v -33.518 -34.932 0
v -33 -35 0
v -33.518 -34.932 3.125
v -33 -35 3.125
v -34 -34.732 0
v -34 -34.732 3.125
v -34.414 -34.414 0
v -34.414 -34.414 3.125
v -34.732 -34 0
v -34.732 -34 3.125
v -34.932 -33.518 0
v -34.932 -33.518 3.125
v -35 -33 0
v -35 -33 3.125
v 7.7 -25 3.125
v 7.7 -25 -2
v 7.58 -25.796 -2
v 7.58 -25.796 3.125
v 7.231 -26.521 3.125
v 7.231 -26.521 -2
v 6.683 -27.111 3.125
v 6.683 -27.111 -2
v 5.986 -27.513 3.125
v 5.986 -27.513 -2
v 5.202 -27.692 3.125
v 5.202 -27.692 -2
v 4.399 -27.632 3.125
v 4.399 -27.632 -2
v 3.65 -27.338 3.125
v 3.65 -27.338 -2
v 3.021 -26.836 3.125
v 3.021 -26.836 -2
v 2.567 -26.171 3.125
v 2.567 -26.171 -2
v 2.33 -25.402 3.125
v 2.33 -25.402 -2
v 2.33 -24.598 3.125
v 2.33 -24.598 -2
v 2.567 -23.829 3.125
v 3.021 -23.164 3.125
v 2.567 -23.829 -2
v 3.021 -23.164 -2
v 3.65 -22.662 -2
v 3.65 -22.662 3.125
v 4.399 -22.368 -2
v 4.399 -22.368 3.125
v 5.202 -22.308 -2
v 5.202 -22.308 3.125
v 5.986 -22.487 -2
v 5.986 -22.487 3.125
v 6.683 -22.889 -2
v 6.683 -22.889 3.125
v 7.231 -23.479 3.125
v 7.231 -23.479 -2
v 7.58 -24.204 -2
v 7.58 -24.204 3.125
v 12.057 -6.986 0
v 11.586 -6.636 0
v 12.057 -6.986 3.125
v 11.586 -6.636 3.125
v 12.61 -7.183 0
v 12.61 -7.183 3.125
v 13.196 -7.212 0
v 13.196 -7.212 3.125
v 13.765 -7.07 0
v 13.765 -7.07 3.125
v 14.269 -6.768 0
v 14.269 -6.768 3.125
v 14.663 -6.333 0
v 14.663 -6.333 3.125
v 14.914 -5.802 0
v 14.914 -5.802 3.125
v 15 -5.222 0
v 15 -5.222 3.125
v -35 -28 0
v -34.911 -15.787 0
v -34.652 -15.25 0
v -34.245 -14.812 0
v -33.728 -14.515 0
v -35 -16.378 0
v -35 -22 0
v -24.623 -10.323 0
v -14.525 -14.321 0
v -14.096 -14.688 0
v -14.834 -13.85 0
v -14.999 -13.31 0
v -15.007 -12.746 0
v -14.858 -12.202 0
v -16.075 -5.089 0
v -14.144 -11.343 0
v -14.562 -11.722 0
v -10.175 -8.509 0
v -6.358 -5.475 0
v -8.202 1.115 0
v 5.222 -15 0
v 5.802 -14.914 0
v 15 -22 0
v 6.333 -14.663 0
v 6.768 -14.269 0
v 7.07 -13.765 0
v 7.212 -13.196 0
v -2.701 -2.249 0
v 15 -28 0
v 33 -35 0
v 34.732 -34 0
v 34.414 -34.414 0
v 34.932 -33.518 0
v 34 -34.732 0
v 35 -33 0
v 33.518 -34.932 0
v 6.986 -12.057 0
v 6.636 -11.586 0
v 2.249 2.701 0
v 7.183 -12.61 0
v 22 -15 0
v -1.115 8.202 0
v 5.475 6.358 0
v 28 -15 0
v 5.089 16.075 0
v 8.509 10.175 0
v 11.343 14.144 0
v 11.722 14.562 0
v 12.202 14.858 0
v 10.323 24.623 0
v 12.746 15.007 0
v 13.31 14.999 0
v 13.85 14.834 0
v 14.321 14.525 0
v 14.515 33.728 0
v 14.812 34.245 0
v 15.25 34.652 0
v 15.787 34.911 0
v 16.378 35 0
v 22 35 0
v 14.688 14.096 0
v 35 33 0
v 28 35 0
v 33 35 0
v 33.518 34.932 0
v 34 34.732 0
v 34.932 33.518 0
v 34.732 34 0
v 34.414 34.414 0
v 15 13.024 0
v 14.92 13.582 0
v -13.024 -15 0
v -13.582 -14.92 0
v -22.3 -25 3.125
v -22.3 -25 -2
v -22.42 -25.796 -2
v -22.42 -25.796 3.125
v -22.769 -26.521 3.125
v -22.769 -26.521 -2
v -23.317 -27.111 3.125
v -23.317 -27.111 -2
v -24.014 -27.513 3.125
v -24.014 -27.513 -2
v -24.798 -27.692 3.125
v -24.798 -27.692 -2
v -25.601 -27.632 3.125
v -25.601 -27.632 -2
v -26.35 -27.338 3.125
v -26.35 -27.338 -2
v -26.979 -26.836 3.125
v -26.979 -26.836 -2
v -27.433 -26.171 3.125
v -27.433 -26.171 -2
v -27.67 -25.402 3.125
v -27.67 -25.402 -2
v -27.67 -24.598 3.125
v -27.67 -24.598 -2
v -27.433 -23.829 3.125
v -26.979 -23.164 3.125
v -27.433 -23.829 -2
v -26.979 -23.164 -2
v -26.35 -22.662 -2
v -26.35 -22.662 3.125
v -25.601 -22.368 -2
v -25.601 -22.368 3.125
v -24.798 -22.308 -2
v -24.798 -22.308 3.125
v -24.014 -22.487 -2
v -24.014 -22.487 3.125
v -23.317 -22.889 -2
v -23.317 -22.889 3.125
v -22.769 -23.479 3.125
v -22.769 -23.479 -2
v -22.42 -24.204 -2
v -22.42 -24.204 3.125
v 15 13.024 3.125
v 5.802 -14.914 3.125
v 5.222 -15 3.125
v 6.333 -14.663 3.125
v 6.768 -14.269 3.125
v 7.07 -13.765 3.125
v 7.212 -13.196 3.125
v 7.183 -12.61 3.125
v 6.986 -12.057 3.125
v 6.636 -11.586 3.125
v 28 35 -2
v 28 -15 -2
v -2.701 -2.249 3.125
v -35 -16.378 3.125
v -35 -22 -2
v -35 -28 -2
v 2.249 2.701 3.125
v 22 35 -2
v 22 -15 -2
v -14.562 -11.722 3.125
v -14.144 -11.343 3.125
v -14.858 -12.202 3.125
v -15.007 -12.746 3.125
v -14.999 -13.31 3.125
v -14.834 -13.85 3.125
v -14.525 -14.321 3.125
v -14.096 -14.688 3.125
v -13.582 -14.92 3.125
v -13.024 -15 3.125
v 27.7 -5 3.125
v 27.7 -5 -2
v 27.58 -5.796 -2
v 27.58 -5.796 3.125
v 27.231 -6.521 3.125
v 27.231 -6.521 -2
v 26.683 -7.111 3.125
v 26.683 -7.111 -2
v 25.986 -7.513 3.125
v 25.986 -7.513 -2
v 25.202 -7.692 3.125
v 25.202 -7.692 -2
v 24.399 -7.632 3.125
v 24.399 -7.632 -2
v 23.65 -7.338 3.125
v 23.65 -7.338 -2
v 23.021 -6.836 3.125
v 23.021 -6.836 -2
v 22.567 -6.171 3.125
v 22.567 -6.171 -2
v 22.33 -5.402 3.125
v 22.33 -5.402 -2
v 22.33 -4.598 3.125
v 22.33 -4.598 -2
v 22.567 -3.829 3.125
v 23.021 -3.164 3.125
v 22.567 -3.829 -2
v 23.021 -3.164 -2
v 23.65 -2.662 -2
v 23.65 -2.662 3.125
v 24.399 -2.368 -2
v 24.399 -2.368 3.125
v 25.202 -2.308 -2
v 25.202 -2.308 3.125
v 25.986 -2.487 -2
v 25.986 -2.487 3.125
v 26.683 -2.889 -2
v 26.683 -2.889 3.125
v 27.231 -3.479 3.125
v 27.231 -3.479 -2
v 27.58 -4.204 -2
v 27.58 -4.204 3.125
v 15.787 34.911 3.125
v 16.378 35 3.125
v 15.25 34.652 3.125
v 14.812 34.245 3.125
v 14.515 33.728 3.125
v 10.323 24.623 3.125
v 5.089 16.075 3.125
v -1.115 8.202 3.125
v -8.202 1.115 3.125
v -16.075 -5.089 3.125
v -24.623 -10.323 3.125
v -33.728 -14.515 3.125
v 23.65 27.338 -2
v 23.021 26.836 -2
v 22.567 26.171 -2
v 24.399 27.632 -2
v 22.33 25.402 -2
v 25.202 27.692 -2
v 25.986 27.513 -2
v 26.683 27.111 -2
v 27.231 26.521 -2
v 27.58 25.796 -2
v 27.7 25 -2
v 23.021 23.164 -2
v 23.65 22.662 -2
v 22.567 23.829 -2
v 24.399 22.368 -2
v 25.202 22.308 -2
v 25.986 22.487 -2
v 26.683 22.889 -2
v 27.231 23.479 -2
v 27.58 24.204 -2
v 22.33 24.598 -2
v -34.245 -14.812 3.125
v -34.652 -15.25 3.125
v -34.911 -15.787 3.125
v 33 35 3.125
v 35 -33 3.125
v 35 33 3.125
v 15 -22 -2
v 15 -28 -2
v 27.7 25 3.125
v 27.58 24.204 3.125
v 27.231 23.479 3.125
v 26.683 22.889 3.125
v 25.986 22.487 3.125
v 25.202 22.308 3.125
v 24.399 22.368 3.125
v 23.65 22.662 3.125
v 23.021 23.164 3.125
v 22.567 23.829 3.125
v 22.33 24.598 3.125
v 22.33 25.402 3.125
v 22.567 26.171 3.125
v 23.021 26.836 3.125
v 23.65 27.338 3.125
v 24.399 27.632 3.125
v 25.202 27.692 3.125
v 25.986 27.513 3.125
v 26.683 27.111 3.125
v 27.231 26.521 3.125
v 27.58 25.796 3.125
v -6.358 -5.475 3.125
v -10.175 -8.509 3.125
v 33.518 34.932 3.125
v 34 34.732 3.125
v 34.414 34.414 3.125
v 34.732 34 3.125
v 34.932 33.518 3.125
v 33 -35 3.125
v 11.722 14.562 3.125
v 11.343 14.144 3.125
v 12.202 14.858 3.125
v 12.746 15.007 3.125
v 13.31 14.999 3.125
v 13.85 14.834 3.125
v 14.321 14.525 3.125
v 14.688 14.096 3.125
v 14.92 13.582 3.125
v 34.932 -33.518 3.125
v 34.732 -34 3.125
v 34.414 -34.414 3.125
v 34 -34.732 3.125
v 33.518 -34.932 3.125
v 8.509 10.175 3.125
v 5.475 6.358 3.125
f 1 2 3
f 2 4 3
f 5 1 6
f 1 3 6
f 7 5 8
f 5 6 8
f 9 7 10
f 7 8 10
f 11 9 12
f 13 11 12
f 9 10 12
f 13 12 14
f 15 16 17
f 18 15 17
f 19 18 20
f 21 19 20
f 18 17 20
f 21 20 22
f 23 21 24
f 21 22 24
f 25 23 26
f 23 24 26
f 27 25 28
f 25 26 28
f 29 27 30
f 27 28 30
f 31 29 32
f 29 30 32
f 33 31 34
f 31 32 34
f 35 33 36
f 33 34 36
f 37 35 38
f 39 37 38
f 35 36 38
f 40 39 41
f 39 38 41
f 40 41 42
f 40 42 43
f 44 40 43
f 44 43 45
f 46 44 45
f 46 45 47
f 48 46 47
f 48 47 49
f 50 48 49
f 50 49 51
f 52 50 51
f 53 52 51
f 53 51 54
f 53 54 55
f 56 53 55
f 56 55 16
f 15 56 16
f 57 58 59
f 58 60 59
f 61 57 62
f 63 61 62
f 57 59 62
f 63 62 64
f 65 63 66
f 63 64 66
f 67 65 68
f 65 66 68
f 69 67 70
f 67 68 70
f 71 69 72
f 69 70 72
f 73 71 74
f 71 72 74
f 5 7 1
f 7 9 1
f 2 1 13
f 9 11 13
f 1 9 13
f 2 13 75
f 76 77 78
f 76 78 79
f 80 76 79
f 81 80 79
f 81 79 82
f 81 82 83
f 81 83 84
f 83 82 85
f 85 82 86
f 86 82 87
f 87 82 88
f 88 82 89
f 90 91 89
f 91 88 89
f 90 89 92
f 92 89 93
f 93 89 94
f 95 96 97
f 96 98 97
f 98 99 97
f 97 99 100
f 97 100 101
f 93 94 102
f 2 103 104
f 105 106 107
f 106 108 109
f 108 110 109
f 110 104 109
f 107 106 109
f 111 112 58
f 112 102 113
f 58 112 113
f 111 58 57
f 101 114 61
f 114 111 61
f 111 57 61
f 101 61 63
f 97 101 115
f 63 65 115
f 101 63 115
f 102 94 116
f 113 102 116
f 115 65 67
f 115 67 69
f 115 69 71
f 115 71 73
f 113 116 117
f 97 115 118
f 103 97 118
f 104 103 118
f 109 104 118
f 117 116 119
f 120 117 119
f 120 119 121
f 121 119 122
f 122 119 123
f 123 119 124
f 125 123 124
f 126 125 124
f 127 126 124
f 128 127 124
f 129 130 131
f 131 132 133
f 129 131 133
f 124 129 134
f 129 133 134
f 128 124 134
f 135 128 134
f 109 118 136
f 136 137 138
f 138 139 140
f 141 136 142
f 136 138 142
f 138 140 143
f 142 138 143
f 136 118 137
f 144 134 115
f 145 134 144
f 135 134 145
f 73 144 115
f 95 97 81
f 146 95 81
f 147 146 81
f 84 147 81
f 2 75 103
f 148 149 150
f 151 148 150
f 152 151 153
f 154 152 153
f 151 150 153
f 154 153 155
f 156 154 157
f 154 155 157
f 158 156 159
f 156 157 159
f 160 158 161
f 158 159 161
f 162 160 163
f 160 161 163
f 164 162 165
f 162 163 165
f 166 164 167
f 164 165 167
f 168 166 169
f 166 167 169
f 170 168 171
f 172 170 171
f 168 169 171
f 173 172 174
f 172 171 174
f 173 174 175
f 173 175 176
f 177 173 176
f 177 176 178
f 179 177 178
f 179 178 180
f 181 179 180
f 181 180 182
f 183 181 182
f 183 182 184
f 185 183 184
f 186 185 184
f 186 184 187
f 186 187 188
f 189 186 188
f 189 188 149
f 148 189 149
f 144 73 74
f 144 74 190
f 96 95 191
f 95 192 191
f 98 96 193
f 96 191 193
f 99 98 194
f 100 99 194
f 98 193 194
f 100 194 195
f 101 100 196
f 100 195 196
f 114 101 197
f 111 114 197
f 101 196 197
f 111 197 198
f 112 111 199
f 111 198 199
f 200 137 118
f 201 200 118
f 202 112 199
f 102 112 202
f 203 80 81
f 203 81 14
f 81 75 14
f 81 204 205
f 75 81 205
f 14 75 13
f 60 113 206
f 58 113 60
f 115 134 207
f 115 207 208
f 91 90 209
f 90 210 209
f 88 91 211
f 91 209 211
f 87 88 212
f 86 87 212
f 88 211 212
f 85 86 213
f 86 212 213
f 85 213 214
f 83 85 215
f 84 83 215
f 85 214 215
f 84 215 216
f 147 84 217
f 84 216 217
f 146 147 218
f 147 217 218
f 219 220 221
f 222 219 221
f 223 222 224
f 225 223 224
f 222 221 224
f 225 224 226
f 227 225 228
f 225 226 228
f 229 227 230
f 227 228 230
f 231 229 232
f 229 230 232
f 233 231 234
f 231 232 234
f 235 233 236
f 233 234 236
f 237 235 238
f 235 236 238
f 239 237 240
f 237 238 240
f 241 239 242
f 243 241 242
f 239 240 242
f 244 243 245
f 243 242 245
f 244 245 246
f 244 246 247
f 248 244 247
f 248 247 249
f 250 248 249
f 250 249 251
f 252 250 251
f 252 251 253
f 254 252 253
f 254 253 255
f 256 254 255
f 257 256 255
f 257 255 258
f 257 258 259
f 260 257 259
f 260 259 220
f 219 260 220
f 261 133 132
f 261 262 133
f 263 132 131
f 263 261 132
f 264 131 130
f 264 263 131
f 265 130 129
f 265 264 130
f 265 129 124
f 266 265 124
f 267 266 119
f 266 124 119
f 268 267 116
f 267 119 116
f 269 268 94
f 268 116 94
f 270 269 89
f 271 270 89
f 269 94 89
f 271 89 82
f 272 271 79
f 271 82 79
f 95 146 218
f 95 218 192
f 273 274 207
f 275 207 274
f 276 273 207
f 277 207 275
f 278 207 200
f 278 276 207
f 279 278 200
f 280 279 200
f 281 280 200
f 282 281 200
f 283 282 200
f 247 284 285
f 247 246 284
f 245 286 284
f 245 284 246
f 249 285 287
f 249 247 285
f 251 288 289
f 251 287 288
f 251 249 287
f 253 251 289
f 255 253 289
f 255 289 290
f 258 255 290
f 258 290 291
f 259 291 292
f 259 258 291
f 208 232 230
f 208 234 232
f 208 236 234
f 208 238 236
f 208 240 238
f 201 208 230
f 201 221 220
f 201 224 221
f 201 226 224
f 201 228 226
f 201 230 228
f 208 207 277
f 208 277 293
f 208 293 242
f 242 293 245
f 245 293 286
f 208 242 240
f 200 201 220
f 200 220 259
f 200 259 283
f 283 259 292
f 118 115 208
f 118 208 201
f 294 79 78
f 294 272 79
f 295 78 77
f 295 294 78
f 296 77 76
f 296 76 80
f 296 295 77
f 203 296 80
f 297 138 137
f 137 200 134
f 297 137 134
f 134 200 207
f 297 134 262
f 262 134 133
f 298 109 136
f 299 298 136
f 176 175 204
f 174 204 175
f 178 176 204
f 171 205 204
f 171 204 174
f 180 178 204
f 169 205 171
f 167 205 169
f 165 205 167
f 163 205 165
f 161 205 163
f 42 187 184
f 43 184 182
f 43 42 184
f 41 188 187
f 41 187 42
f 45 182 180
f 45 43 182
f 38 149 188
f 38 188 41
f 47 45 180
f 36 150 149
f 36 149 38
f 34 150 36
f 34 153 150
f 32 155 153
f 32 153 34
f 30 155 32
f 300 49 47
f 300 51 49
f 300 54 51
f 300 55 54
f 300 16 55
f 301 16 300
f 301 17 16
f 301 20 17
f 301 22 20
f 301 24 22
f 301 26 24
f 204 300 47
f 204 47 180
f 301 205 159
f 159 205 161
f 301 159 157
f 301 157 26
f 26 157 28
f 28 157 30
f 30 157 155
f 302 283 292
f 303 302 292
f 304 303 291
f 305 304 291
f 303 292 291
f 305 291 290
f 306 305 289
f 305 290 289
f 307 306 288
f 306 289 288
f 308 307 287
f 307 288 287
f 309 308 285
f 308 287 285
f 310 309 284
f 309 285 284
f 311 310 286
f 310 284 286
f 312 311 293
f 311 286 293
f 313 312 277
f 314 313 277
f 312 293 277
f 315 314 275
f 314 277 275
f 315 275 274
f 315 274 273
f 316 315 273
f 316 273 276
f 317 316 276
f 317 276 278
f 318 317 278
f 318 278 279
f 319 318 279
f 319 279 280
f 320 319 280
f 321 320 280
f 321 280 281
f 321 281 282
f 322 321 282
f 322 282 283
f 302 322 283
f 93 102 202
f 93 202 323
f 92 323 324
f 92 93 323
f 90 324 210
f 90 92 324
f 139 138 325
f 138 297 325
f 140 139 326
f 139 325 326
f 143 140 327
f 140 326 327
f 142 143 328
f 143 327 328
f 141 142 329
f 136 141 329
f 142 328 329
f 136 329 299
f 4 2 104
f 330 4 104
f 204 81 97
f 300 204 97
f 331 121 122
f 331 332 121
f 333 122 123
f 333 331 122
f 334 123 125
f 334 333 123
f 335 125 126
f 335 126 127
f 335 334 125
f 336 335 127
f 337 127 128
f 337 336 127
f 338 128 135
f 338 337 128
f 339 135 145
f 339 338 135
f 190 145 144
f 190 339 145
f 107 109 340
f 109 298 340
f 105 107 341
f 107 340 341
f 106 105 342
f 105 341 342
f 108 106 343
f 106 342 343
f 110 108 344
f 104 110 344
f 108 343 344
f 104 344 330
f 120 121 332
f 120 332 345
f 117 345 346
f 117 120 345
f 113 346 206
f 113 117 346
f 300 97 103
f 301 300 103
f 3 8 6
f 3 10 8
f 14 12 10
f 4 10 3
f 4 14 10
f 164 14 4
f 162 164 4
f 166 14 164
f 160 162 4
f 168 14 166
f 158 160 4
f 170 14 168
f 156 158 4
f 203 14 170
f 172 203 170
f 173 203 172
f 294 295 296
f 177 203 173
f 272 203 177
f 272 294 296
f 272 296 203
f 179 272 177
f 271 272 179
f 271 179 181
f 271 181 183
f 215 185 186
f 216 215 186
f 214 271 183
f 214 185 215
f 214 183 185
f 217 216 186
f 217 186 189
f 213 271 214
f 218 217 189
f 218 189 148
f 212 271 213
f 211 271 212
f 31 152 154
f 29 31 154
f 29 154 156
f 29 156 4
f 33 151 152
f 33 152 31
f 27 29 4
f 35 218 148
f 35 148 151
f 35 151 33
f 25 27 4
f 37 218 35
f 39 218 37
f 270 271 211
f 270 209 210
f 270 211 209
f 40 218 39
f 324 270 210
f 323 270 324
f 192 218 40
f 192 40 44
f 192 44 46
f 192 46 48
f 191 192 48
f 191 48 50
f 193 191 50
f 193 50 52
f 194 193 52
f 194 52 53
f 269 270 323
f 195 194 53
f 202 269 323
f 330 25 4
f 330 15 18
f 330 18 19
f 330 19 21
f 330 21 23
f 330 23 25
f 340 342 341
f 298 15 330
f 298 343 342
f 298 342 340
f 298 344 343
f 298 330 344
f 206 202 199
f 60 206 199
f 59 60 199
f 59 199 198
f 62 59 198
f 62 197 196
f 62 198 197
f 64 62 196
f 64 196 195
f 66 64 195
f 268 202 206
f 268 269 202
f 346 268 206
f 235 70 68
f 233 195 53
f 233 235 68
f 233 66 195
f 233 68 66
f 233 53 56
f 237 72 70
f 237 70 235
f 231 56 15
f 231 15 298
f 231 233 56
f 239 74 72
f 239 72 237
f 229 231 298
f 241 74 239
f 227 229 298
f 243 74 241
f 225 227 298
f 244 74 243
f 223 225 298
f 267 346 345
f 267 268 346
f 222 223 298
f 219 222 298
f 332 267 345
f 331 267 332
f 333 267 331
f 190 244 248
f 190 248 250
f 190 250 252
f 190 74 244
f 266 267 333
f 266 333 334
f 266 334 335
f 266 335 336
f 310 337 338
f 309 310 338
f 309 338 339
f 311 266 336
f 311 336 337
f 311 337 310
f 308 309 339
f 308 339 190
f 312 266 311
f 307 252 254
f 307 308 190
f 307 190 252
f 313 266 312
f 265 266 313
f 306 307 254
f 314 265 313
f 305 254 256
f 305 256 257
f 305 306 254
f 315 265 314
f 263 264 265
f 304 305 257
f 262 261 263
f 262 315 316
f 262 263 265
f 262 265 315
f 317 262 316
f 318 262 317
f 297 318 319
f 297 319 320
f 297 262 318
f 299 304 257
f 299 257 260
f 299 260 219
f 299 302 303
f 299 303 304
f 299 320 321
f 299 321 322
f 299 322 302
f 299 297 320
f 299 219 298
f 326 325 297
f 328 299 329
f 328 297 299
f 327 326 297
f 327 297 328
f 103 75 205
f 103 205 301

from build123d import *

# Parameters (mm, degrees)
F1_DEPTH = 3.125
F2_W     = 6
F2_H     = 50
F2_W_2   = 50
F2_H_2   = 6
F3_DEPTH = 2
F4_R     = 2.7
F5_DEPTH = 25
F6_R     = 2
F8_DEPTH = 25
F9_R     = 2


# Not quite as in the source:
# - a feature names something its author has since deleted; it is built from what else it names


with BuildPart() as f1:
    # F0 (on Top) → F1 (new body)
    with BuildSketch(Plane.XY):
        with BuildLine():
            Line((35, 35), (15, 35))
            ThreePointArc((15, 35), (-4.5539513718, 4.5539513718), (-35, -15))
            Line((-35, -15), (-35, -35))
            Line((-35, -35), (35, -35))
            Line((35, -35), (35, 35))
        make_face()
    extrude(amount=F1_DEPTH)

    # F2 (on face) → F3 (join)
    with BuildSketch(Plane(origin=(0, 0, 0), x_dir=(1, 0, 0), z_dir=(0, 0, -1))):
        with Locations((25, -10)):
            Rectangle(F2_W, F2_H)
        with Locations((-10, 25)):
            Rectangle(F2_W_2, F2_H_2)
    extrude(amount=F3_DEPTH)

    # F4 (on face) → F5 (cut)
    with BuildSketch(Plane(origin=(0, 0, -2), x_dir=(1, 0, 0), z_dir=(0, 0, -1))):
        with Locations((25, -25)):
            Circle(F4_R)
        with Locations((25, 5)):
            Circle(F4_R)
        with Locations((5, 25)):
            Circle(F4_R)
        with Locations((-25, 25)):
            Circle(F4_R)
    extrude(amount=-F5_DEPTH, mode=Mode.SUBTRACT)

    # F6
    f6_edges = [f1.edges().sort_by_distance(p)[0] for p in [
        (35, 35, 1.5625),
        (15, 35, 1.5625),
        (-35, -15, 1.5625),
        (-35, -35, 1.5625),
        (35, -35, 1.5625),
    ]]
    fillet(f6_edges, radius=F6_R)

    # F7 (on Top) → F8 (cut)
    with BuildSketch(Plane.XY):
        with BuildLine():
            Line((15, -10.0502525317), (15, 20))
            ThreePointArc((15, 20), (9.1151461726, 10.9887424757), (2.2488038315, 2.7009436368))
            Line((2.2488038315, 2.7009436368), (15, -10.0502525317))
        make_face()
        with BuildLine():
            ThreePointArc((-2.7009436368, -2.2488038315), (-10.9887424757, -9.1151461726), (-20, -15))
            Line((-20, -15), (10.0502525317, -15))
            Line((10.0502525317, -15), (-2.7009436368, -2.2488038315))
        make_face()
    extrude(amount=F8_DEPTH, mode=Mode.SUBTRACT)

    # F9
    f9_edges = [f1.edges().sort_by_distance(p)[0] for p in [
        (15, 20, 1.5625),
        (-20, -15, 1.5625),
        (10.050253, -15, 1.5625),
        (15, -10.050253, 1.5625),
    ]]
    fillet(f9_edges, radius=F9_R)


solid = f1.part
